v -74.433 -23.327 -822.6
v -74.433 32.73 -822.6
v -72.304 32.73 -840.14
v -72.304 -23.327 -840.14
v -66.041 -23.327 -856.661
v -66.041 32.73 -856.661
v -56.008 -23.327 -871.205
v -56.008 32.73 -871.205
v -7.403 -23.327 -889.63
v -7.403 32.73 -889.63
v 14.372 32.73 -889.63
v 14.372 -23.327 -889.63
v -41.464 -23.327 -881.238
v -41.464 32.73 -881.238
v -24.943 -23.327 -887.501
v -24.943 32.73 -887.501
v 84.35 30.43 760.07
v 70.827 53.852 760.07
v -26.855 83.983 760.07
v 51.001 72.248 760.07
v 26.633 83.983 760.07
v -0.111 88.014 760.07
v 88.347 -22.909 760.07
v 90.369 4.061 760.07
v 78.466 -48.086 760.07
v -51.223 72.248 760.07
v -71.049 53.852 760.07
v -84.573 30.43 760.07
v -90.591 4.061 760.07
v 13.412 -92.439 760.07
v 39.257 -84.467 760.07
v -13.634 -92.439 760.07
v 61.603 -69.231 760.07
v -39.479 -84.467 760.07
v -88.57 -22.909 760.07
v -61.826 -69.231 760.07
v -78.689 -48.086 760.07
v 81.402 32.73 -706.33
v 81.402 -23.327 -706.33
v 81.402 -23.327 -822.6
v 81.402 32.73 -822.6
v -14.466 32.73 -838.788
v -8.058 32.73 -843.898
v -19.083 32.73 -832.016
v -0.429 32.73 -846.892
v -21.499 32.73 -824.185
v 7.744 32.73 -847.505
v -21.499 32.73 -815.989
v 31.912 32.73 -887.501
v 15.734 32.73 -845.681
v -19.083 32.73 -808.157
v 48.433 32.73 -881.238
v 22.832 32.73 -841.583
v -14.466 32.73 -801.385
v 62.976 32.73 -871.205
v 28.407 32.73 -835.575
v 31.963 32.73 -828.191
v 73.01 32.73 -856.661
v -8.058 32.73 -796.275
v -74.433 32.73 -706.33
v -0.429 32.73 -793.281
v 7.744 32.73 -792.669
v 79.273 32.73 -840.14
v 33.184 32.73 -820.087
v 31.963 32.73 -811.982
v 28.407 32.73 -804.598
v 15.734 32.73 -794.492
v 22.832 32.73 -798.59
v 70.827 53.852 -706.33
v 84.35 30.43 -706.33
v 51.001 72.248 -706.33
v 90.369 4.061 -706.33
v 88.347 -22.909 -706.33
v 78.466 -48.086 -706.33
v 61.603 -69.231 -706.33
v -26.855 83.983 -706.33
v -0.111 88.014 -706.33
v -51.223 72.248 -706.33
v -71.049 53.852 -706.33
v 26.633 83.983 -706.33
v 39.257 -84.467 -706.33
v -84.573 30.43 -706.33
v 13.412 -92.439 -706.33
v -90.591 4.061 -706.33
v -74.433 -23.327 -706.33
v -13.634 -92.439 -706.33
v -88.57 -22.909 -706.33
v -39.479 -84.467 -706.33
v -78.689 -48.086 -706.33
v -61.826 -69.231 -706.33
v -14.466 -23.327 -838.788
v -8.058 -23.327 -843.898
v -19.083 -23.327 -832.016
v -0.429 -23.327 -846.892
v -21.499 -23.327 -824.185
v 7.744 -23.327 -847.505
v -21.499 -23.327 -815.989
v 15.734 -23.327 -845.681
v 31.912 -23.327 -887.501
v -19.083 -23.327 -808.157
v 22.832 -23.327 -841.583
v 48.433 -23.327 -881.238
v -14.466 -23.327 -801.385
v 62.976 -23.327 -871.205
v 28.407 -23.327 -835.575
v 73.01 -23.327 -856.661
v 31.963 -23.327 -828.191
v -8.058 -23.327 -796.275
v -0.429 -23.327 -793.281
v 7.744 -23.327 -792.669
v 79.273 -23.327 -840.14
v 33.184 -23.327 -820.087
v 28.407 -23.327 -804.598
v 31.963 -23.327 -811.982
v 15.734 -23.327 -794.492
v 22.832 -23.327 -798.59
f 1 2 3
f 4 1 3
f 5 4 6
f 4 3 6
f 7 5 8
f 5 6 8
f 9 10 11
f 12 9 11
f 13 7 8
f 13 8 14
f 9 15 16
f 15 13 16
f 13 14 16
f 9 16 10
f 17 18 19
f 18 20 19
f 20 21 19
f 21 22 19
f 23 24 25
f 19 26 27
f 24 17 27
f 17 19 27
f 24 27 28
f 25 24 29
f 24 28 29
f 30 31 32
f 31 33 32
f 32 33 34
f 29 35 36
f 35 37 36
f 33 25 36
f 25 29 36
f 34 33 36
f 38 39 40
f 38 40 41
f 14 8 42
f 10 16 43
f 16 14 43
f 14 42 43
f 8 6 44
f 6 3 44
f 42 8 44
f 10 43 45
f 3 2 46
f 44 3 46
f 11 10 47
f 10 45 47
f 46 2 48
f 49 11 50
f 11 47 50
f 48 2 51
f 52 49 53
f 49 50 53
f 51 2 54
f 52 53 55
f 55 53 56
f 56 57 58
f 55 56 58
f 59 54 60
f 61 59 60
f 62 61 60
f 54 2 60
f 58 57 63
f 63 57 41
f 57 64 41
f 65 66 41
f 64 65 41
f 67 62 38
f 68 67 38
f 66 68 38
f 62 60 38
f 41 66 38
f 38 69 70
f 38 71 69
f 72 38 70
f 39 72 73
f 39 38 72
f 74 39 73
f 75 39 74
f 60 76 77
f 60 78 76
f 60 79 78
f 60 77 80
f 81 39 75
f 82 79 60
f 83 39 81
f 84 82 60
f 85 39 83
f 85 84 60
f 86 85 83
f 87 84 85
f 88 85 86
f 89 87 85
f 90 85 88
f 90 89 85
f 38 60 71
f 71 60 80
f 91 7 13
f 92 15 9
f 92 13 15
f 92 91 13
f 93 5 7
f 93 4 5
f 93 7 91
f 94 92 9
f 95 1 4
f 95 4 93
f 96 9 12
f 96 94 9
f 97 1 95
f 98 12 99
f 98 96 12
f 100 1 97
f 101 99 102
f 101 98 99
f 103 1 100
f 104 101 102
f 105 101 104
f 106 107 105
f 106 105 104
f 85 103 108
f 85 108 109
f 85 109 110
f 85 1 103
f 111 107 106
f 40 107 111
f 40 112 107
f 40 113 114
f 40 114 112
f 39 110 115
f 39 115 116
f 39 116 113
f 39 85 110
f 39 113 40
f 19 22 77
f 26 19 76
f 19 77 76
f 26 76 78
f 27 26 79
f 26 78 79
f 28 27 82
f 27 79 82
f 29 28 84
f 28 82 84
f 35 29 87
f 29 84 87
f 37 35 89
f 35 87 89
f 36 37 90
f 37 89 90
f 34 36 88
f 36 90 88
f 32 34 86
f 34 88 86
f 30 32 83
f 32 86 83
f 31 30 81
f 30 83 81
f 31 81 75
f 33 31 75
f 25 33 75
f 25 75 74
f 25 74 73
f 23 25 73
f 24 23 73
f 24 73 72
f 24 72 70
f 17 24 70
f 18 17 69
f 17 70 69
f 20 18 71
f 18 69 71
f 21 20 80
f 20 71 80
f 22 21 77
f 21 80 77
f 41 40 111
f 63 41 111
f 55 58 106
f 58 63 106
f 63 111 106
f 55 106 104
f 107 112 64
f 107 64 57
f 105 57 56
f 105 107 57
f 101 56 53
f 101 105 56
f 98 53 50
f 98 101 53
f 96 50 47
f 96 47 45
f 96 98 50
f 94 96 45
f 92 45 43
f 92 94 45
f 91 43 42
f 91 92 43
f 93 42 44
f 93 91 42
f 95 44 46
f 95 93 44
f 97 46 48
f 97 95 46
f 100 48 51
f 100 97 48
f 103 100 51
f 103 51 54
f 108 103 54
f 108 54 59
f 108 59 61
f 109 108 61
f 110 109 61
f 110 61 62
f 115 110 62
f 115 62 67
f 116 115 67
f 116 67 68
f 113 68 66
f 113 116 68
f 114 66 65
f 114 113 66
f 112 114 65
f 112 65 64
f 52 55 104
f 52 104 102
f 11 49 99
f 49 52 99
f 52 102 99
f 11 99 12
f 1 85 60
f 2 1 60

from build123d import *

# Parameters (mm, degrees)
SKETCH1_W           = 80
SKETCH1_H           = 4.95
SKETCH2_W           = 8.501628875
SKETCH2_H           = 3.058191312
BOSS_EXTRUDE1_DEPTH = 50
CHAMFER1_SIZE       = 2
FILLET1_R           = 4
HOLE1_START         = -3.599264013
HOLE1_OUTLINE_R     = 1.5
HOLE1_DEPTH         = 3.058191312
SCALE1_SCALE        = 18.33


# Read off the part's stored shape, not the designer's step: Hole1
with BuildPart() as part:
    # Sketch1 → Revolve1 (revolve)
    with BuildSketch(Plane(origin=(0, 0, 0), x_dir=(0, 0, -1), z_dir=(1, 0, 0))):
        Rectangle(SKETCH1_W, SKETCH1_H)
    revolve(axis=Axis((0, -2.475, -40), (0, 0, 1)))

    # Sketch2 → Boss-Extrude1 (add)
    with BuildSketch(Plane.XY):
        with Locations((0.196159038, -2.070168357)):
            Rectangle(SKETCH2_W, SKETCH2_H)
    extrude(amount=-BOSS_EXTRUDE1_DEPTH)

    # Chamfer1
    chamfer1_edges = [part.edges().sort_by_distance(p)[0] for p in [
        (4.446973476, -2.070168357, -50),
        (-4.054655399, -2.070168357, -50),
    ]]
    chamfer(chamfer1_edges, length=CHAMFER1_SIZE)

    # Fillet1
    # the kernel refuses this fillet: 4 mm, written as the material it takes off along each edge
    with BuildSketch(Plane(origin=(-2.054655399, 3.601062923, -50), x_dir=(-0.7071067811865491, 0, 0.7071067811865459), z_dir=(0, -1, 0)), Plane(origin=(4.446973476, -7.741399637, -48), x_dir=(0, 0, 1), z_dir=(0, 1, 0)), Plane(origin=(-4.054655399, 3.601062923, -48), x_dir=(0, 0, 1), z_dir=(0, -1, 0))) as fillet1_piece_1:
        with BuildLine():
            CenterArc((FILLET1_R * 0.414213562373, -FILLET1_R), FILLET1_R, 90, 45)
            Line((-FILLET1_R * 0.292893218813, -FILLET1_R * 0.292893218813), (0, 0))
            Line((0, 0), (FILLET1_R * 0.414213562373, 0))
        make_face()
    extrude(amount=11.34246256, mode=Mode.SUBTRACT)
    with BuildSketch(Plane(origin=(2.446973476, -7.741399637, -50), x_dir=(-1, 0, 0), z_dir=(0, 1, 0))) as fillet1_piece_2:
        with BuildLine():
            CenterArc((FILLET1_R * 0.414213562373, FILLET1_R), FILLET1_R, 225, 45)
            Line((-FILLET1_R * 0.292893218813, FILLET1_R * 0.292893218813), (0, 0))
            Line((0, 0), (FILLET1_R * 0.414213562373, 0))
        make_face()
    extrude(amount=11.34246256, mode=Mode.SUBTRACT)

    # Hole1 outline → Hole1 (cut)
    with BuildSketch(Plane(origin=(0, 0, 0), x_dir=(1, 0, 0), z_dir=(0, 1, 0)).offset(HOLE1_START)):
        with Locations((0.316437215, 46.206035657)):
            Circle(HOLE1_OUTLINE_R)
    extrude(amount=HOLE1_DEPTH, mode=Mode.SUBTRACT)


with BuildPart() as part_1:
    # Scale1: scaled about (0.006416206, -2.460917228, -1.550485335)
    add(part.part.scale(SCALE1_SCALE).moved(Location((-0.11119285, 42.647695561, 26.869910856))))


solid = part_1.part
